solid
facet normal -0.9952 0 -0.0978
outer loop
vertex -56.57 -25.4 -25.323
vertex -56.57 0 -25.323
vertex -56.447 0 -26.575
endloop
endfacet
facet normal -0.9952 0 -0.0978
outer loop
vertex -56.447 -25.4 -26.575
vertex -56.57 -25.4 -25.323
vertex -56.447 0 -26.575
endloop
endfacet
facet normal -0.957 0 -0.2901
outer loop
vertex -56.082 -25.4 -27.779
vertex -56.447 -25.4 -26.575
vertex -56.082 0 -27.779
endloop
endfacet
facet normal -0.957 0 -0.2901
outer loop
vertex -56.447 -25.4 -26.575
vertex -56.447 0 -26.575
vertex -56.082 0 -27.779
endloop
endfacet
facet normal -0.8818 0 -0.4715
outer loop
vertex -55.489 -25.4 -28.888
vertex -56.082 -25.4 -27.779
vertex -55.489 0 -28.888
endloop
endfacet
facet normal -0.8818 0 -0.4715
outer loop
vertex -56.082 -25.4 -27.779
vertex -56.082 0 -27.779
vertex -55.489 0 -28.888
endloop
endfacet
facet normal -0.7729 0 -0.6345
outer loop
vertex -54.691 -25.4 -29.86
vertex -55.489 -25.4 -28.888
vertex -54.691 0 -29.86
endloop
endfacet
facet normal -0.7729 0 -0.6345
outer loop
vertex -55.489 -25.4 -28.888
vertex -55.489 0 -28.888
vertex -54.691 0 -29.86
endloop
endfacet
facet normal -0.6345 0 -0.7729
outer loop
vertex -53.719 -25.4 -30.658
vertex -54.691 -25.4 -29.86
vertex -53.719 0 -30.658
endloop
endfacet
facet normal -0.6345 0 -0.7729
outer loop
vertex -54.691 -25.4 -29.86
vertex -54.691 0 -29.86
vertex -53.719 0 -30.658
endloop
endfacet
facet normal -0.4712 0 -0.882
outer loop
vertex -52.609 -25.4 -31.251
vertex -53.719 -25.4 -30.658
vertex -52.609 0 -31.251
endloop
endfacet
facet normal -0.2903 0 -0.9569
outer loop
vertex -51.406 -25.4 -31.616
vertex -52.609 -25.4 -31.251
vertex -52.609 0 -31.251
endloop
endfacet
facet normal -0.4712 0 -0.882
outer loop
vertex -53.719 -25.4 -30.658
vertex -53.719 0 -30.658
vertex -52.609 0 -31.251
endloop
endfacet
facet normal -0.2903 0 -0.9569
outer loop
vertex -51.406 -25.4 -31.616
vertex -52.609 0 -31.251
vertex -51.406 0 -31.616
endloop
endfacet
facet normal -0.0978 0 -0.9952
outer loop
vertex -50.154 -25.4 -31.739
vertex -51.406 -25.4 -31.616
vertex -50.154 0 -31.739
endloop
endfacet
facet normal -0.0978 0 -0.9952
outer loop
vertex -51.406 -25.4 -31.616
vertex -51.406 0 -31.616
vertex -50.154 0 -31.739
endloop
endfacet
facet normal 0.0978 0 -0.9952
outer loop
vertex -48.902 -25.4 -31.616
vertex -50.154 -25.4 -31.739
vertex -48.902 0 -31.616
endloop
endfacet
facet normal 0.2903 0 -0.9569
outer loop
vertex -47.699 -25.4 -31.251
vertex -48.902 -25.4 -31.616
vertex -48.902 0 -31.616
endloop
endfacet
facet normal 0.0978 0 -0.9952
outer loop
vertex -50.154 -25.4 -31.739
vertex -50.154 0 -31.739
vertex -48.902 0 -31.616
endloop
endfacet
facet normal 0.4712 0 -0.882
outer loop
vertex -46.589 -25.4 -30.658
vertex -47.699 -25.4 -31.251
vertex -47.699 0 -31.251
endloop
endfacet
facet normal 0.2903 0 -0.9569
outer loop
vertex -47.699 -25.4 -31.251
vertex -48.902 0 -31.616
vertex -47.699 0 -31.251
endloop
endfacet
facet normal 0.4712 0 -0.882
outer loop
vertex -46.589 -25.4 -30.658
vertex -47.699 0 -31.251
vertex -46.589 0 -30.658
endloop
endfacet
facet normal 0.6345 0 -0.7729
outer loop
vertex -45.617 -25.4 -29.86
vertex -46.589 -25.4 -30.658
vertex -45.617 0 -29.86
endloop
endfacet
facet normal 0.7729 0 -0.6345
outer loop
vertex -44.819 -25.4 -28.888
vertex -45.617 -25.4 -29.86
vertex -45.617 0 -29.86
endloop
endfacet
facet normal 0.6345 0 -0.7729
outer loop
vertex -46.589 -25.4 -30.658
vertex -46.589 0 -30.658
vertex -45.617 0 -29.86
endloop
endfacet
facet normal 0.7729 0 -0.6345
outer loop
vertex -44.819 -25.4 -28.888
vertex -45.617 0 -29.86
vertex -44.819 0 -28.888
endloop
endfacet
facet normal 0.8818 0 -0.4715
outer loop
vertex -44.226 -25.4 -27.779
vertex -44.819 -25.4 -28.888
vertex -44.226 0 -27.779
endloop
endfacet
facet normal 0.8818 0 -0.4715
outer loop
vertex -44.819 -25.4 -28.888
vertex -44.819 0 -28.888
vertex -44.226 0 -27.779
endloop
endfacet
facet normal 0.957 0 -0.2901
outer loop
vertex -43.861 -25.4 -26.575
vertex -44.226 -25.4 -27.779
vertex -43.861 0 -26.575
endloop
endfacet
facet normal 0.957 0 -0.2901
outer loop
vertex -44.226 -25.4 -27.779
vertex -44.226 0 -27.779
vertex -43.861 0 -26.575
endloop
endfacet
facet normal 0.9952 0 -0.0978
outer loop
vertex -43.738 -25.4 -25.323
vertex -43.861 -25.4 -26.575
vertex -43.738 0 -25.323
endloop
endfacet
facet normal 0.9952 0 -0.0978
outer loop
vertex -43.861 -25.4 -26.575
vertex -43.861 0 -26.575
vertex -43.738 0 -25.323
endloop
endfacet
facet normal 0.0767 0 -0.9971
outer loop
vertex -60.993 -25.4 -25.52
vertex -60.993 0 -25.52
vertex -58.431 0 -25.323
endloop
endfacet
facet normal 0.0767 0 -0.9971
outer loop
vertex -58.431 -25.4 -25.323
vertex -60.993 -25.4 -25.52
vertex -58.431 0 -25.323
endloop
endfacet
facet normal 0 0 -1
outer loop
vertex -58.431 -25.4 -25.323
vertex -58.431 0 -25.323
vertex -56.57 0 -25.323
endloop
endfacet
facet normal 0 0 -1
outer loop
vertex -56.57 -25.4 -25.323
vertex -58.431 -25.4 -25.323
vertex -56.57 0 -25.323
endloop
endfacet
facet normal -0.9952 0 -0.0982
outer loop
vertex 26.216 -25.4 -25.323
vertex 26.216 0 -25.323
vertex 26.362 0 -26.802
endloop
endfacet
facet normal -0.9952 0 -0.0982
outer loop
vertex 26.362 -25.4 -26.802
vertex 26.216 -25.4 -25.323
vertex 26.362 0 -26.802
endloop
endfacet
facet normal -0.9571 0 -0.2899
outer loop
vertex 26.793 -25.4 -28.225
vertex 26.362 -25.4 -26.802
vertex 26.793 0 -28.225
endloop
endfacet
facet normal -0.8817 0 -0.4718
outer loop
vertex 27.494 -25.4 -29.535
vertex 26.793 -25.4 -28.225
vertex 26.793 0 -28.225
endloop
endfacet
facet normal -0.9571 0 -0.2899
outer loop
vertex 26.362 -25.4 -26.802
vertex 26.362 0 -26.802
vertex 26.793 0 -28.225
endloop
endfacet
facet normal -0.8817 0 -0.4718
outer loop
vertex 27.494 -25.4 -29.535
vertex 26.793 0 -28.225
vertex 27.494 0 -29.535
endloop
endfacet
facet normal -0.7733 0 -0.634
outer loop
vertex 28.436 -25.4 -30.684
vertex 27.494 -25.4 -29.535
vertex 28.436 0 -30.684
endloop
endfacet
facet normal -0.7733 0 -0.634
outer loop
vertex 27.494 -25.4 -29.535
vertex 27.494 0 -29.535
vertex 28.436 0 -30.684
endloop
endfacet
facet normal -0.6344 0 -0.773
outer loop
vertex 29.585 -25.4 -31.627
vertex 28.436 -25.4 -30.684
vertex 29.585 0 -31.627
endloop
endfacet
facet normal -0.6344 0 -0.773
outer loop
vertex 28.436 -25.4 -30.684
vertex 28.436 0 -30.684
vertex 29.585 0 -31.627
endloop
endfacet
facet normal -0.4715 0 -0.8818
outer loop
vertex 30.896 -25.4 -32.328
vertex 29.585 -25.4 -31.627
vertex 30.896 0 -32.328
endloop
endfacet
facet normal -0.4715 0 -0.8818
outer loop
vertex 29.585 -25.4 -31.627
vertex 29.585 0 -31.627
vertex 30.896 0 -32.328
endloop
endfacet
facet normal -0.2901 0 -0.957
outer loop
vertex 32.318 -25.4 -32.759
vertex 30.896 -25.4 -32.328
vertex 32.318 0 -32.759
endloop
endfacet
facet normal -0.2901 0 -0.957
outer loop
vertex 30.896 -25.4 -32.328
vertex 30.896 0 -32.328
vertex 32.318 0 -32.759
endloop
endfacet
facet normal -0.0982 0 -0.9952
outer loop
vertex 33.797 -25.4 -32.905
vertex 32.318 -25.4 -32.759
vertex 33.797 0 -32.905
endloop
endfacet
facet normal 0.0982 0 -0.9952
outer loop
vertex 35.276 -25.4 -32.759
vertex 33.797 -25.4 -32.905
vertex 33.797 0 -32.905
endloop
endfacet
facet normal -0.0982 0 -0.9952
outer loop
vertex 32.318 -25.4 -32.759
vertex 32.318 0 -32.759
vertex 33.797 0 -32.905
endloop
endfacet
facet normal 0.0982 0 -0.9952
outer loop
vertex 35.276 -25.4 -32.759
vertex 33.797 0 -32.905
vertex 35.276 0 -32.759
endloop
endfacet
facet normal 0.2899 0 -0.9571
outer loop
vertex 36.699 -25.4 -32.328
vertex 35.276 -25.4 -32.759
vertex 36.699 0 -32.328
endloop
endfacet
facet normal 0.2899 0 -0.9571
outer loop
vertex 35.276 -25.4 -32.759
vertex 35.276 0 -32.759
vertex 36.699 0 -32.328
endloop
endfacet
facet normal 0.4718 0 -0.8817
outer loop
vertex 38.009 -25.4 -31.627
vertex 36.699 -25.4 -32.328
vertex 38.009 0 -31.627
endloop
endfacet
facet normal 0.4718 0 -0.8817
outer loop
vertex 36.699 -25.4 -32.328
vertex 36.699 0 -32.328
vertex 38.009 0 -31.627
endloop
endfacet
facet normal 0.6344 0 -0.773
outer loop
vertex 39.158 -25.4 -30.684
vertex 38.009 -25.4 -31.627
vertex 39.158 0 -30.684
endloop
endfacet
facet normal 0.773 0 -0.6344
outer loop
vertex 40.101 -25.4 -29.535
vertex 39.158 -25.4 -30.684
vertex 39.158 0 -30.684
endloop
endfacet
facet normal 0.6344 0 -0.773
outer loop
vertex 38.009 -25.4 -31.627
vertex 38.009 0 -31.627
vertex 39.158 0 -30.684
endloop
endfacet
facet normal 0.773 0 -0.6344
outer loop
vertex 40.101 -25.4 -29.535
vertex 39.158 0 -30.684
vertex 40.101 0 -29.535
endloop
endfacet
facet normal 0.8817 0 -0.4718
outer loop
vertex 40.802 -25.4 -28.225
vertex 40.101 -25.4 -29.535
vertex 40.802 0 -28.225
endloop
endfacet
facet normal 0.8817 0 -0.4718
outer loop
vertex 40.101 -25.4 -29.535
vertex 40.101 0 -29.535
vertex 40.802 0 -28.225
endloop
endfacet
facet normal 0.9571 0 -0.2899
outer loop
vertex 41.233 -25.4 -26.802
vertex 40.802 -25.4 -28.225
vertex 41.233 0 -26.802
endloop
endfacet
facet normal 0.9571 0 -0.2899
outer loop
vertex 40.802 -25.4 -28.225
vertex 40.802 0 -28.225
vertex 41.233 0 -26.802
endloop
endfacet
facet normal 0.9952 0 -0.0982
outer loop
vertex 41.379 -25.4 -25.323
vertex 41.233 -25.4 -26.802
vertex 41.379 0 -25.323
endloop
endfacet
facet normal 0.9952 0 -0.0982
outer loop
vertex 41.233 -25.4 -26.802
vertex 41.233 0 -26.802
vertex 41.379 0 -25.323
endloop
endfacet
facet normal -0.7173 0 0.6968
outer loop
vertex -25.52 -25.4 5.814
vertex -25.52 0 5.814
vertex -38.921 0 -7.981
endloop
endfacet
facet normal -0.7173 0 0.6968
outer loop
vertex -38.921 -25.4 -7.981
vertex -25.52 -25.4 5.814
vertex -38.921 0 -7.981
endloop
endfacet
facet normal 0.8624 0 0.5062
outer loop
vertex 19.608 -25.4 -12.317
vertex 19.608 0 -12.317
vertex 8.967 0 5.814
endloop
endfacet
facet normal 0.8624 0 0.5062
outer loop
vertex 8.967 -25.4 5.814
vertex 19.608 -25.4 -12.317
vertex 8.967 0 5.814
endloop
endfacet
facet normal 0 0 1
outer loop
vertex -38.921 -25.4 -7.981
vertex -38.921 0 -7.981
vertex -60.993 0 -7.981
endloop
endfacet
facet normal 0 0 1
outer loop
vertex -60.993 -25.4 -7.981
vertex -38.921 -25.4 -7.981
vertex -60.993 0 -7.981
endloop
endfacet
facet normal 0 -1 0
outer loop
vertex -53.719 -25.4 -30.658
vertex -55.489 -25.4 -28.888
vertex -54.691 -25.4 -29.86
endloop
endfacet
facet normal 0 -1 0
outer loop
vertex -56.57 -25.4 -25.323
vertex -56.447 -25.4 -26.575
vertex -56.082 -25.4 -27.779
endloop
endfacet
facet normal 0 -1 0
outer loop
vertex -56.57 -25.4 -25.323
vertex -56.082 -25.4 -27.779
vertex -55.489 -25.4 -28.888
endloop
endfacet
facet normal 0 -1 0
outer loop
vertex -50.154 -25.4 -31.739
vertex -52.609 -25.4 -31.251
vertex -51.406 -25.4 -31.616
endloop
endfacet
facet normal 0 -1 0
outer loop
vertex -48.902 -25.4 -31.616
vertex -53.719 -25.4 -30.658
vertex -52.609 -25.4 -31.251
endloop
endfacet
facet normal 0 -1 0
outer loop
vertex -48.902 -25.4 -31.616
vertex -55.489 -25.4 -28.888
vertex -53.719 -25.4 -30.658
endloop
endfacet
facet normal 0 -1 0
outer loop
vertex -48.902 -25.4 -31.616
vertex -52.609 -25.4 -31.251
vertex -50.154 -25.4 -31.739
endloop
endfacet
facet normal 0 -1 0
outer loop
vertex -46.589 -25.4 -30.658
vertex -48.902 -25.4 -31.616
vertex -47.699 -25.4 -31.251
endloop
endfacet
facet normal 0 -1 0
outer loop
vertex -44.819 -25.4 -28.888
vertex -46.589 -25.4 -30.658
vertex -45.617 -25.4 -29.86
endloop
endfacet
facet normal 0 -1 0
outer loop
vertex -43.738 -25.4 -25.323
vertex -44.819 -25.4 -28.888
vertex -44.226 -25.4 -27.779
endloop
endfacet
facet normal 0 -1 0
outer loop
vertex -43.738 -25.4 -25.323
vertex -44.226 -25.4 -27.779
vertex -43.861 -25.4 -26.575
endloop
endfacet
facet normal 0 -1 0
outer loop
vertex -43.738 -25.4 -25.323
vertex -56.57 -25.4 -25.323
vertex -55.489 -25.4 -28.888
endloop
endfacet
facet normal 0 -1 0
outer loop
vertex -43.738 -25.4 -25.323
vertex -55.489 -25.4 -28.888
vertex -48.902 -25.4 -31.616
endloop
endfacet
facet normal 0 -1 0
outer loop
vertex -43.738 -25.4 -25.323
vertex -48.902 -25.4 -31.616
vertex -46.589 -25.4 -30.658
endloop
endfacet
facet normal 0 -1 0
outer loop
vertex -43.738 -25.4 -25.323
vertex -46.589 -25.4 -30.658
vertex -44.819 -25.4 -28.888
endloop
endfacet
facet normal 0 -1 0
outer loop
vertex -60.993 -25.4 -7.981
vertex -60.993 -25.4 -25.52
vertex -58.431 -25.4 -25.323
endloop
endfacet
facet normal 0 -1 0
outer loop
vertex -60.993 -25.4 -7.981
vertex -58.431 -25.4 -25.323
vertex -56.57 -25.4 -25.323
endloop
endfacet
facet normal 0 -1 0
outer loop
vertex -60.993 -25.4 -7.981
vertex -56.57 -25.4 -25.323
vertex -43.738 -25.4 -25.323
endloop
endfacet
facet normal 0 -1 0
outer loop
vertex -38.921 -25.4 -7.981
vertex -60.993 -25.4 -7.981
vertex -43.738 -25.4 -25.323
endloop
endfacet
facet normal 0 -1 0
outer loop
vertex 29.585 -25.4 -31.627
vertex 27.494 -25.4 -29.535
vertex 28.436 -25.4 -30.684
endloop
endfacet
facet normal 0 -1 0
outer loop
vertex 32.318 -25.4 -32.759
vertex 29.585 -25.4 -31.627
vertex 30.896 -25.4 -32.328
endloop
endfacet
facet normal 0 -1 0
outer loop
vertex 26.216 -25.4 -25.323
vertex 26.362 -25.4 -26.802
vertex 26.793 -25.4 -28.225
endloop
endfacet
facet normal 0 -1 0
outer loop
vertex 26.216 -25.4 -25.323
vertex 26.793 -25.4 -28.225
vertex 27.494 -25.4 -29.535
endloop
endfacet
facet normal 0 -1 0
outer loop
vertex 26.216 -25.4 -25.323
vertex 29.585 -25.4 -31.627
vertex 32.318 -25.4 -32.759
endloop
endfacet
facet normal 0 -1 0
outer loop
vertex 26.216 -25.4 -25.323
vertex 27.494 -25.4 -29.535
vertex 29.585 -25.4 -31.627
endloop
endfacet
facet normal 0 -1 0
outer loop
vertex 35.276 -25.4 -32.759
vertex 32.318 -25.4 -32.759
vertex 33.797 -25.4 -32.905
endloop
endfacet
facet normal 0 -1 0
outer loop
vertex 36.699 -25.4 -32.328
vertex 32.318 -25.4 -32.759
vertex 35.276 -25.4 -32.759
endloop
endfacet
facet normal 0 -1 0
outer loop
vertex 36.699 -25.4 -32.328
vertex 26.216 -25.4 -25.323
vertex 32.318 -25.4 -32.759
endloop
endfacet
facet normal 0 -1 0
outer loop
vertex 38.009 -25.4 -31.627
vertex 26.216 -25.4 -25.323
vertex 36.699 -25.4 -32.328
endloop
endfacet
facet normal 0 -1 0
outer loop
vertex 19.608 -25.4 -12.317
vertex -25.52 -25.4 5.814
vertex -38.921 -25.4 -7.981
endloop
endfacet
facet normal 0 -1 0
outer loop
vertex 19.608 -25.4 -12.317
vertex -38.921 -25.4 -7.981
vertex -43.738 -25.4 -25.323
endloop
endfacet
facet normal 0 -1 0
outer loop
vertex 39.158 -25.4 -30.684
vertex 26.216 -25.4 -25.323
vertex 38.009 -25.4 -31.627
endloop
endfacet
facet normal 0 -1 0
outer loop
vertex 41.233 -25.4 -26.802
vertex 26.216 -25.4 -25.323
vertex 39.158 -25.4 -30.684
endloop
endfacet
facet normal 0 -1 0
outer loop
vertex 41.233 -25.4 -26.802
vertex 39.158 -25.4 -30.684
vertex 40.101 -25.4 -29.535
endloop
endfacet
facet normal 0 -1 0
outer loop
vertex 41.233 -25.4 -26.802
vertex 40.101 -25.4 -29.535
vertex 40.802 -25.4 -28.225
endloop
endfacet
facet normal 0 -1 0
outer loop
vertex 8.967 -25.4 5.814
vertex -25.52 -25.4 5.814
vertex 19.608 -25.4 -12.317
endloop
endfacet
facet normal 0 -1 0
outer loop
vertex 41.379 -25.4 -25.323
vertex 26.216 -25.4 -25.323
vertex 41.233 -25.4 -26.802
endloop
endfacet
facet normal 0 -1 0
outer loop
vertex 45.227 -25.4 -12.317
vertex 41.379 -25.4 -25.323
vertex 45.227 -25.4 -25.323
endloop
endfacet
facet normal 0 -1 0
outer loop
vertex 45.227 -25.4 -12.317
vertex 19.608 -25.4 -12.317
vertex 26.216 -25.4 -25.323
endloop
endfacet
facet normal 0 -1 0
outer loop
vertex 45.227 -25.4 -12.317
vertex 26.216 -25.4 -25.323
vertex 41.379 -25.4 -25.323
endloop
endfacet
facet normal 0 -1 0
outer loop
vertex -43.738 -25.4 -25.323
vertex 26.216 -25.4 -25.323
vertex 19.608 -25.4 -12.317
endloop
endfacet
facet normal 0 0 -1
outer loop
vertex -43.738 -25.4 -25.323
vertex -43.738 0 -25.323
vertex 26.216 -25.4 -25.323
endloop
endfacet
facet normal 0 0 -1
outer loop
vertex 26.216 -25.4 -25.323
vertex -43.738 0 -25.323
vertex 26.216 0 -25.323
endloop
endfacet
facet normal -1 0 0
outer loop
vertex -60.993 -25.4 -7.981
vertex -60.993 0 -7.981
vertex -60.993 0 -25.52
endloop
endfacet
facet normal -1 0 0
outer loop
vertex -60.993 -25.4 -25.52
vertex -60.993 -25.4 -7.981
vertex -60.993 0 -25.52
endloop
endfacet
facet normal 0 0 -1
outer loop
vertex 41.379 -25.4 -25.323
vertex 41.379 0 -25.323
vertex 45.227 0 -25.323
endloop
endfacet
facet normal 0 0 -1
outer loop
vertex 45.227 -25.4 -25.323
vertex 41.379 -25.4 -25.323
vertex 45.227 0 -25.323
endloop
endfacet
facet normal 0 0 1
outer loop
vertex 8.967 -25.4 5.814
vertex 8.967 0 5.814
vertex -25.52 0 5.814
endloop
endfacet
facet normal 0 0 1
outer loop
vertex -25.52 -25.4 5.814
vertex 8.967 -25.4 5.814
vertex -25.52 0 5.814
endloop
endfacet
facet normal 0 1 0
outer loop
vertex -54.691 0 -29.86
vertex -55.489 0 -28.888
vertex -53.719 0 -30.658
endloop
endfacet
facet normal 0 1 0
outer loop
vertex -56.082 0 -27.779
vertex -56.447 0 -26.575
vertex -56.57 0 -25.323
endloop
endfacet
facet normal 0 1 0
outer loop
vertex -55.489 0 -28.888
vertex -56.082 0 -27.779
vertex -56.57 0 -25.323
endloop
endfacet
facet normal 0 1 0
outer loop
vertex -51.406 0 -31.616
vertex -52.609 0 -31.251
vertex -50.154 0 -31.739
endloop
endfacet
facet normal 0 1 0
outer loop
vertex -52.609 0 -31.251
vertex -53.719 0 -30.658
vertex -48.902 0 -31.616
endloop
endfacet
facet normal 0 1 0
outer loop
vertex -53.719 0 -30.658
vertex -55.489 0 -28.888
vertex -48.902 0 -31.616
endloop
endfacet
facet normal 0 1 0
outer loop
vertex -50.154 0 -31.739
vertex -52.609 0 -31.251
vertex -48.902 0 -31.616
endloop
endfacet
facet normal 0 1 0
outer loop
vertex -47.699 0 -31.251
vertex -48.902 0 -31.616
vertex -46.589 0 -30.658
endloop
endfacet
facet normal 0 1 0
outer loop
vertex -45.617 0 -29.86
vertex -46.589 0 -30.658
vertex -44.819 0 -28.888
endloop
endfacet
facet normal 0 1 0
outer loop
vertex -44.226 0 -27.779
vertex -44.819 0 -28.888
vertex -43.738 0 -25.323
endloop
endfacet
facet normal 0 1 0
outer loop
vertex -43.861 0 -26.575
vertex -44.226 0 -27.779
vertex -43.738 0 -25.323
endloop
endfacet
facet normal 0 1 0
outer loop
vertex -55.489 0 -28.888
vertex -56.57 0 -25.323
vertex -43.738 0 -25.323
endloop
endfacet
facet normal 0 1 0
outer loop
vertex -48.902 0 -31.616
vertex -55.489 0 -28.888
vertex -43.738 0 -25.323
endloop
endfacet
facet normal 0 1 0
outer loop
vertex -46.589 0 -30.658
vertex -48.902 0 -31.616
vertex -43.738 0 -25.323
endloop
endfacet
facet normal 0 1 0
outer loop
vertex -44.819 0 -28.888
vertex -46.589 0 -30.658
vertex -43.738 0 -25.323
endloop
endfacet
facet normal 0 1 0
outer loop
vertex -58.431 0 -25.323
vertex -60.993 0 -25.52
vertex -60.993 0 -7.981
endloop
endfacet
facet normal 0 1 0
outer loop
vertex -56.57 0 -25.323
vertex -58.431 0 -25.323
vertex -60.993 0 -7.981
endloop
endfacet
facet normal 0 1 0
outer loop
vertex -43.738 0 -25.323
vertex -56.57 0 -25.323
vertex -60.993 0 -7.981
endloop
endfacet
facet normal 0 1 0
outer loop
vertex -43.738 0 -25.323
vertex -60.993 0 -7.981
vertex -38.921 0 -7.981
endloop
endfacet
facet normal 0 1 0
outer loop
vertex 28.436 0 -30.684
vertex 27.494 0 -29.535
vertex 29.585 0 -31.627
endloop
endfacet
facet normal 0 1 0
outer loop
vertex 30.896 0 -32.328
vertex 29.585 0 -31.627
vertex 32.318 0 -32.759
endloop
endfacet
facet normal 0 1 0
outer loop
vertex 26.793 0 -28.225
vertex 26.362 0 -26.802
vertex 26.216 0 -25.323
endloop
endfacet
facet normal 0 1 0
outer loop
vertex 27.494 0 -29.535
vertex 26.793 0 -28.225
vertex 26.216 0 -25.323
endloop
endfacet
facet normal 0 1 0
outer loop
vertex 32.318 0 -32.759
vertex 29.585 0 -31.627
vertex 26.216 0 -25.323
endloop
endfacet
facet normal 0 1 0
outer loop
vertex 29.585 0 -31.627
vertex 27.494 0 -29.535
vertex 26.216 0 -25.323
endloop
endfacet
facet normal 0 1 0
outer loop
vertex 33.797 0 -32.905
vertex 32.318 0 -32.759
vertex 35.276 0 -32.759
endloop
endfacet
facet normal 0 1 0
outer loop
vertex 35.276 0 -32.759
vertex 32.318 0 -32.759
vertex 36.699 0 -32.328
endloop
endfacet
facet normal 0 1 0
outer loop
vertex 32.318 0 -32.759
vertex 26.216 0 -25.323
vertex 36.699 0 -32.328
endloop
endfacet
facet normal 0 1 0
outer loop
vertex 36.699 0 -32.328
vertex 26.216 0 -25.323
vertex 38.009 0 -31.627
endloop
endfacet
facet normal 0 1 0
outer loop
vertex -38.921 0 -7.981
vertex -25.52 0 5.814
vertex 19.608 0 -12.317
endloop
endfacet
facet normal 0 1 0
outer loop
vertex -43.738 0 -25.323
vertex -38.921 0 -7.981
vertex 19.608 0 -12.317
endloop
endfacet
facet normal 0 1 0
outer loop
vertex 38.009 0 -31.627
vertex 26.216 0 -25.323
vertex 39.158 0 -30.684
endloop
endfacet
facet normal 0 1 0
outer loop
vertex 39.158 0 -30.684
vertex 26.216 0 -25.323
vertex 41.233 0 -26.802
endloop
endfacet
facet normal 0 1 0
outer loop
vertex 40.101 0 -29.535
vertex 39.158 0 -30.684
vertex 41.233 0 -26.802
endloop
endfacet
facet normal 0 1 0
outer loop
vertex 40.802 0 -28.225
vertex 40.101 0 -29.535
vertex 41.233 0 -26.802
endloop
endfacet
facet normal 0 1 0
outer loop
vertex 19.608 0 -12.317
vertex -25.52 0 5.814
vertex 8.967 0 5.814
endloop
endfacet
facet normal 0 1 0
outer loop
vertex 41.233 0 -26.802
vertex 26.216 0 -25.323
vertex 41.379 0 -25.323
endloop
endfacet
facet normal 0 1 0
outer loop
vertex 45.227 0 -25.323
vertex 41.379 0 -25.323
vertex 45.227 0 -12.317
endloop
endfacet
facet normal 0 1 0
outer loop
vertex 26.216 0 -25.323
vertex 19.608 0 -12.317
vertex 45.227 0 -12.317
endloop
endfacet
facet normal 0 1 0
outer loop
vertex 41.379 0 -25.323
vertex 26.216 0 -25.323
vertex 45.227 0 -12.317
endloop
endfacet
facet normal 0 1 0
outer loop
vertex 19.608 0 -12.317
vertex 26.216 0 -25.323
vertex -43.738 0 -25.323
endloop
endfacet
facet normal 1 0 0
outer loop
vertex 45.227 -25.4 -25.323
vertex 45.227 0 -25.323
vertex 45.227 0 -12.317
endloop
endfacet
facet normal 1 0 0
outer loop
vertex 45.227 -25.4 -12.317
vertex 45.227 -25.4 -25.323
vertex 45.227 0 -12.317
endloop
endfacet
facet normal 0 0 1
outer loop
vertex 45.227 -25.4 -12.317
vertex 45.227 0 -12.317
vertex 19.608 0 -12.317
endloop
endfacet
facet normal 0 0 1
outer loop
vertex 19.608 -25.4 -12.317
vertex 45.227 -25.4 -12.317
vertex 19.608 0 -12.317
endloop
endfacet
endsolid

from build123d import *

# Parameters (mm, degrees)
F1_DEPTH = 25.4


with BuildPart() as f1:
    # F0 (on Front) → F1 (new body)
    with BuildSketch(Plane.XZ):
        with BuildLine():
            ThreePointArc((26.2159302875, -25.3233611584), (33.7973274291, -17.7419640168), (41.3787245706, -25.3233611584))
            Line((41.3787245706, -25.3233611584), (45.227330178, -25.3233611584))
            Line((45.227330178, -25.3233611584), (45.227330178, -12.3168108985))
            Line((45.227330178, -12.3168108985), (19.6083635092, -12.3168108985))
            Line((19.6083635092, -12.3168108985), (8.9666387066, 5.8135343716))
            Line((8.9666387066, 5.8135343716), (-25.5204308778, 5.8135343716))
            Line((-25.5204308778, 5.8135343716), (-38.9211215079, -7.9812929034))
            Line((-38.9211215079, -7.9812929034), (-60.9928481281, -16.7508628219))
            Line((-60.9928481281, -16.7508628219), (-60.9928481281, -25.5204327404))
            Line((-60.9928481281, -25.5204327404), (-58.4309473634, -25.3233611584))
            Line((-58.4309473634, -25.3233611584), (-56.5701552345, -25.3233611584))
            ThreePointArc((-56.5701552345, -25.3233611584), (-50.1540526748, -18.9072585986), (-43.737950115, -25.3233611584))
            Line((-43.737950115, -25.3233611584), (26.2159302875, -25.3233611584))
        make_face()
        with BuildLine():
            ThreePointArc((26.2159302875, -25.3233611584), (33.7973274291, -32.9047582999), (41.3787245706, -25.3233611584))
            Line((41.3787245706, -25.3233611584), (26.2159302875, -25.3233611584))
        make_face()
        with BuildLine():
            Line((26.2159302875, -25.3233611584), (41.3787245706, -25.3233611584))
            ThreePointArc((41.3787245706, -25.3233611584), (33.7973274291, -17.7419640168), (26.2159302875, -25.3233611584))
        make_face()
        with BuildLine():
            ThreePointArc((-56.5701552345, -25.3233611584), (-50.1540526748, -31.7394637181), (-43.737950115, -25.3233611584))
            Line((-43.737950115, -25.3233611584), (-56.5701552345, -25.3233611584))
        make_face()
        with BuildLine():
            Line((-56.5701552345, -25.3233611584), (-43.737950115, -25.3233611584))
            ThreePointArc((-43.737950115, -25.3233611584), (-50.1540526748, -18.9072585986), (-56.5701552345, -25.3233611584))
        make_face()
        Polygon((-60.9928481281, -16.7508628219), (-38.9211215079, -7.9812929034), (-60.9928481281, -7.9812929034), align=None)
    extrude(amount=F1_DEPTH)


solid = f1.part
